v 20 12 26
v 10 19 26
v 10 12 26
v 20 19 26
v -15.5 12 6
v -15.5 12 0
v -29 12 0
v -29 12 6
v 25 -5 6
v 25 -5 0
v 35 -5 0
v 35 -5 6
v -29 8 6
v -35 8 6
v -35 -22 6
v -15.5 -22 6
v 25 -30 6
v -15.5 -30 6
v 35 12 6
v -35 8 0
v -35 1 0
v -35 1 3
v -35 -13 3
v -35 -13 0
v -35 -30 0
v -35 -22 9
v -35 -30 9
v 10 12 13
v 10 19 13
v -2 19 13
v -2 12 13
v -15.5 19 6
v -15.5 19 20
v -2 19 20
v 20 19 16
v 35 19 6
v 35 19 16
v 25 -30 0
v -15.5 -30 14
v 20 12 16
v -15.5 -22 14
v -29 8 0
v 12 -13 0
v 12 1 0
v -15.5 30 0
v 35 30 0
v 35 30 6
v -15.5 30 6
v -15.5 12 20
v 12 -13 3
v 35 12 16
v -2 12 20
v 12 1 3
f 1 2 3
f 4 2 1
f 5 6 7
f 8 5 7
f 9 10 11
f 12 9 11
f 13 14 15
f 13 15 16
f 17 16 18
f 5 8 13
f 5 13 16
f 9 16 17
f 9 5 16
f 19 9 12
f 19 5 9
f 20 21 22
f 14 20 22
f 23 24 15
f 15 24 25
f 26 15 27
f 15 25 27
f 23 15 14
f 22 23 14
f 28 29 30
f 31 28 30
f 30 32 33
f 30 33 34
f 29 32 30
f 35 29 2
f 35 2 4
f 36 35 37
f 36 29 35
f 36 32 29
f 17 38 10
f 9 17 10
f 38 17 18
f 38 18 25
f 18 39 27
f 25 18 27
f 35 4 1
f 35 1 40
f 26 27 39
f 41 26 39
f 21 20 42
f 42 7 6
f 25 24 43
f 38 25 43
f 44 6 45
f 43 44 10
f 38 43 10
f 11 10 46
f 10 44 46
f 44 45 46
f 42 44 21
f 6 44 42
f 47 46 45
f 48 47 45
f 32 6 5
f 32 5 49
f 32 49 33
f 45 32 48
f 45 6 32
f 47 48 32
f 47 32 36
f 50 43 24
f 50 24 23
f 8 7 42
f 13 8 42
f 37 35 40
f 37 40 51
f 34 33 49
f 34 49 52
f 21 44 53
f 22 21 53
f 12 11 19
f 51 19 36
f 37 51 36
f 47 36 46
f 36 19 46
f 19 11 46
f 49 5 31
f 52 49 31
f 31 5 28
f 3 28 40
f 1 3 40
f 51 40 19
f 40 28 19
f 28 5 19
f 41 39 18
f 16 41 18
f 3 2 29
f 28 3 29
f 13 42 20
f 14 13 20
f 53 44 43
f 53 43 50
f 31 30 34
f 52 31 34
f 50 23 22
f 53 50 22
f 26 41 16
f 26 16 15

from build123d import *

# Parameters (mm, degrees)
EXTRUDE_1_DEPTH     = 6
EXTRUDE_3_DEPTH     = 8
SKETCH_3_W          = 3
SKETCH_3_H          = 14
CUT_EXTRUDE_1_DEPTH = 47
SKETCH_4_W          = 50.5
SKETCH_4_H          = 7
EXTRUDE_4_DEPTH     = 20
CUT_EXTRUDE_2_REACH = 67.59
SKETCH_5_W          = 13.5
SKETCH_5_H          = 6
SKETCH_5_W_2        = 15
SKETCH_5_H_2        = 10


with BuildPart() as part:
    # Эскиз1 → Бобышка-Вытянуть1 (new body)
    with BuildSketch(Plane.XY):
        Polygon((-35, 8), (-35, -30), (25, -30), (25, -5), (35, -5), (35, 30), (-15.5, 30), (-15.5, 12), (-29, 12), (-29, 8), align=None)
    extrude(amount=EXTRUDE_1_DEPTH)

    # Эскиз2 → Бобышка-Вытянуть3 (add)
    with BuildSketch(Plane.XZ.offset(30)):
        Polygon((-35, 6), (-35, 9), (-15.5, 14), (-15.5, 6), align=None)
    extrude(amount=-EXTRUDE_3_DEPTH)

    # Эскиз3 → Вырез-Вытянуть1 (cut)
    with BuildSketch(Plane.ZY.offset(35)):
        with Locations((1.5, -6)):
            Rectangle(SKETCH_3_W, SKETCH_3_H)
    extrude(amount=-CUT_EXTRUDE_1_DEPTH, mode=Mode.SUBTRACT)

    # Эскиз4 → Бобышка-Вытянуть4 (add)
    with BuildSketch(Plane.XY.offset(6)):
        with Locations((9.75, 15.5)):
            Rectangle(SKETCH_4_W, SKETCH_4_H)
    extrude(amount=EXTRUDE_4_DEPTH)

    # Эскиз5 → Вырез-Вытянуть2 (cut, up to next)
    with BuildSketch(Plane(origin=(0, 19, 0), x_dir=(1, 0, 0), z_dir=(0, 1, 0)), mode=Mode.PRIVATE) as cut_extrude_2_sk1:
        Polygon((-2, -26), (10, -26), (10, -13), (-2, -13), (-2, -20), align=None)
    cut_extrude_2_tool1 = extrude(cut_extrude_2_sk1.sketch, amount=-CUT_EXTRUDE_2_REACH, mode=Mode.PRIVATE) & part.part
    # Эскиз5 → Вырез-Вытянуть2 (cut, up to next)
    with BuildSketch(Plane(origin=(0, 19, 0), x_dir=(1, 0, 0), z_dir=(0, 1, 0)), mode=Mode.PRIVATE) as cut_extrude_2_sk2:
        with Locations((-8.75, -23)):
            Rectangle(SKETCH_5_W, SKETCH_5_H)
    cut_extrude_2_tool2 = extrude(cut_extrude_2_sk2.sketch, amount=-CUT_EXTRUDE_2_REACH, mode=Mode.PRIVATE) & part.part
    # Эскиз5 → Вырез-Вытянуть2 (cut, up to next)
    with BuildSketch(Plane(origin=(0, 19, 0), x_dir=(1, 0, 0), z_dir=(0, 1, 0)), mode=Mode.PRIVATE) as cut_extrude_2_sk3:
        with Locations((27.5, -21)):
            Rectangle(SKETCH_5_W_2, SKETCH_5_H_2)
    cut_extrude_2_tool3 = extrude(cut_extrude_2_sk3.sketch, amount=-CUT_EXTRUDE_2_REACH, mode=Mode.PRIVATE) & part.part
    add(cut_extrude_2_tool1.solids().sort_by_distance((4, 19, 19.5))[0], mode=Mode.SUBTRACT)
    add(cut_extrude_2_tool2.solids().sort_by_distance((-8.75, 19, 23))[0], mode=Mode.SUBTRACT)
    add(cut_extrude_2_tool3.solids().sort_by_distance((27.5, 19, 21))[0], mode=Mode.SUBTRACT)


solid = part.part
